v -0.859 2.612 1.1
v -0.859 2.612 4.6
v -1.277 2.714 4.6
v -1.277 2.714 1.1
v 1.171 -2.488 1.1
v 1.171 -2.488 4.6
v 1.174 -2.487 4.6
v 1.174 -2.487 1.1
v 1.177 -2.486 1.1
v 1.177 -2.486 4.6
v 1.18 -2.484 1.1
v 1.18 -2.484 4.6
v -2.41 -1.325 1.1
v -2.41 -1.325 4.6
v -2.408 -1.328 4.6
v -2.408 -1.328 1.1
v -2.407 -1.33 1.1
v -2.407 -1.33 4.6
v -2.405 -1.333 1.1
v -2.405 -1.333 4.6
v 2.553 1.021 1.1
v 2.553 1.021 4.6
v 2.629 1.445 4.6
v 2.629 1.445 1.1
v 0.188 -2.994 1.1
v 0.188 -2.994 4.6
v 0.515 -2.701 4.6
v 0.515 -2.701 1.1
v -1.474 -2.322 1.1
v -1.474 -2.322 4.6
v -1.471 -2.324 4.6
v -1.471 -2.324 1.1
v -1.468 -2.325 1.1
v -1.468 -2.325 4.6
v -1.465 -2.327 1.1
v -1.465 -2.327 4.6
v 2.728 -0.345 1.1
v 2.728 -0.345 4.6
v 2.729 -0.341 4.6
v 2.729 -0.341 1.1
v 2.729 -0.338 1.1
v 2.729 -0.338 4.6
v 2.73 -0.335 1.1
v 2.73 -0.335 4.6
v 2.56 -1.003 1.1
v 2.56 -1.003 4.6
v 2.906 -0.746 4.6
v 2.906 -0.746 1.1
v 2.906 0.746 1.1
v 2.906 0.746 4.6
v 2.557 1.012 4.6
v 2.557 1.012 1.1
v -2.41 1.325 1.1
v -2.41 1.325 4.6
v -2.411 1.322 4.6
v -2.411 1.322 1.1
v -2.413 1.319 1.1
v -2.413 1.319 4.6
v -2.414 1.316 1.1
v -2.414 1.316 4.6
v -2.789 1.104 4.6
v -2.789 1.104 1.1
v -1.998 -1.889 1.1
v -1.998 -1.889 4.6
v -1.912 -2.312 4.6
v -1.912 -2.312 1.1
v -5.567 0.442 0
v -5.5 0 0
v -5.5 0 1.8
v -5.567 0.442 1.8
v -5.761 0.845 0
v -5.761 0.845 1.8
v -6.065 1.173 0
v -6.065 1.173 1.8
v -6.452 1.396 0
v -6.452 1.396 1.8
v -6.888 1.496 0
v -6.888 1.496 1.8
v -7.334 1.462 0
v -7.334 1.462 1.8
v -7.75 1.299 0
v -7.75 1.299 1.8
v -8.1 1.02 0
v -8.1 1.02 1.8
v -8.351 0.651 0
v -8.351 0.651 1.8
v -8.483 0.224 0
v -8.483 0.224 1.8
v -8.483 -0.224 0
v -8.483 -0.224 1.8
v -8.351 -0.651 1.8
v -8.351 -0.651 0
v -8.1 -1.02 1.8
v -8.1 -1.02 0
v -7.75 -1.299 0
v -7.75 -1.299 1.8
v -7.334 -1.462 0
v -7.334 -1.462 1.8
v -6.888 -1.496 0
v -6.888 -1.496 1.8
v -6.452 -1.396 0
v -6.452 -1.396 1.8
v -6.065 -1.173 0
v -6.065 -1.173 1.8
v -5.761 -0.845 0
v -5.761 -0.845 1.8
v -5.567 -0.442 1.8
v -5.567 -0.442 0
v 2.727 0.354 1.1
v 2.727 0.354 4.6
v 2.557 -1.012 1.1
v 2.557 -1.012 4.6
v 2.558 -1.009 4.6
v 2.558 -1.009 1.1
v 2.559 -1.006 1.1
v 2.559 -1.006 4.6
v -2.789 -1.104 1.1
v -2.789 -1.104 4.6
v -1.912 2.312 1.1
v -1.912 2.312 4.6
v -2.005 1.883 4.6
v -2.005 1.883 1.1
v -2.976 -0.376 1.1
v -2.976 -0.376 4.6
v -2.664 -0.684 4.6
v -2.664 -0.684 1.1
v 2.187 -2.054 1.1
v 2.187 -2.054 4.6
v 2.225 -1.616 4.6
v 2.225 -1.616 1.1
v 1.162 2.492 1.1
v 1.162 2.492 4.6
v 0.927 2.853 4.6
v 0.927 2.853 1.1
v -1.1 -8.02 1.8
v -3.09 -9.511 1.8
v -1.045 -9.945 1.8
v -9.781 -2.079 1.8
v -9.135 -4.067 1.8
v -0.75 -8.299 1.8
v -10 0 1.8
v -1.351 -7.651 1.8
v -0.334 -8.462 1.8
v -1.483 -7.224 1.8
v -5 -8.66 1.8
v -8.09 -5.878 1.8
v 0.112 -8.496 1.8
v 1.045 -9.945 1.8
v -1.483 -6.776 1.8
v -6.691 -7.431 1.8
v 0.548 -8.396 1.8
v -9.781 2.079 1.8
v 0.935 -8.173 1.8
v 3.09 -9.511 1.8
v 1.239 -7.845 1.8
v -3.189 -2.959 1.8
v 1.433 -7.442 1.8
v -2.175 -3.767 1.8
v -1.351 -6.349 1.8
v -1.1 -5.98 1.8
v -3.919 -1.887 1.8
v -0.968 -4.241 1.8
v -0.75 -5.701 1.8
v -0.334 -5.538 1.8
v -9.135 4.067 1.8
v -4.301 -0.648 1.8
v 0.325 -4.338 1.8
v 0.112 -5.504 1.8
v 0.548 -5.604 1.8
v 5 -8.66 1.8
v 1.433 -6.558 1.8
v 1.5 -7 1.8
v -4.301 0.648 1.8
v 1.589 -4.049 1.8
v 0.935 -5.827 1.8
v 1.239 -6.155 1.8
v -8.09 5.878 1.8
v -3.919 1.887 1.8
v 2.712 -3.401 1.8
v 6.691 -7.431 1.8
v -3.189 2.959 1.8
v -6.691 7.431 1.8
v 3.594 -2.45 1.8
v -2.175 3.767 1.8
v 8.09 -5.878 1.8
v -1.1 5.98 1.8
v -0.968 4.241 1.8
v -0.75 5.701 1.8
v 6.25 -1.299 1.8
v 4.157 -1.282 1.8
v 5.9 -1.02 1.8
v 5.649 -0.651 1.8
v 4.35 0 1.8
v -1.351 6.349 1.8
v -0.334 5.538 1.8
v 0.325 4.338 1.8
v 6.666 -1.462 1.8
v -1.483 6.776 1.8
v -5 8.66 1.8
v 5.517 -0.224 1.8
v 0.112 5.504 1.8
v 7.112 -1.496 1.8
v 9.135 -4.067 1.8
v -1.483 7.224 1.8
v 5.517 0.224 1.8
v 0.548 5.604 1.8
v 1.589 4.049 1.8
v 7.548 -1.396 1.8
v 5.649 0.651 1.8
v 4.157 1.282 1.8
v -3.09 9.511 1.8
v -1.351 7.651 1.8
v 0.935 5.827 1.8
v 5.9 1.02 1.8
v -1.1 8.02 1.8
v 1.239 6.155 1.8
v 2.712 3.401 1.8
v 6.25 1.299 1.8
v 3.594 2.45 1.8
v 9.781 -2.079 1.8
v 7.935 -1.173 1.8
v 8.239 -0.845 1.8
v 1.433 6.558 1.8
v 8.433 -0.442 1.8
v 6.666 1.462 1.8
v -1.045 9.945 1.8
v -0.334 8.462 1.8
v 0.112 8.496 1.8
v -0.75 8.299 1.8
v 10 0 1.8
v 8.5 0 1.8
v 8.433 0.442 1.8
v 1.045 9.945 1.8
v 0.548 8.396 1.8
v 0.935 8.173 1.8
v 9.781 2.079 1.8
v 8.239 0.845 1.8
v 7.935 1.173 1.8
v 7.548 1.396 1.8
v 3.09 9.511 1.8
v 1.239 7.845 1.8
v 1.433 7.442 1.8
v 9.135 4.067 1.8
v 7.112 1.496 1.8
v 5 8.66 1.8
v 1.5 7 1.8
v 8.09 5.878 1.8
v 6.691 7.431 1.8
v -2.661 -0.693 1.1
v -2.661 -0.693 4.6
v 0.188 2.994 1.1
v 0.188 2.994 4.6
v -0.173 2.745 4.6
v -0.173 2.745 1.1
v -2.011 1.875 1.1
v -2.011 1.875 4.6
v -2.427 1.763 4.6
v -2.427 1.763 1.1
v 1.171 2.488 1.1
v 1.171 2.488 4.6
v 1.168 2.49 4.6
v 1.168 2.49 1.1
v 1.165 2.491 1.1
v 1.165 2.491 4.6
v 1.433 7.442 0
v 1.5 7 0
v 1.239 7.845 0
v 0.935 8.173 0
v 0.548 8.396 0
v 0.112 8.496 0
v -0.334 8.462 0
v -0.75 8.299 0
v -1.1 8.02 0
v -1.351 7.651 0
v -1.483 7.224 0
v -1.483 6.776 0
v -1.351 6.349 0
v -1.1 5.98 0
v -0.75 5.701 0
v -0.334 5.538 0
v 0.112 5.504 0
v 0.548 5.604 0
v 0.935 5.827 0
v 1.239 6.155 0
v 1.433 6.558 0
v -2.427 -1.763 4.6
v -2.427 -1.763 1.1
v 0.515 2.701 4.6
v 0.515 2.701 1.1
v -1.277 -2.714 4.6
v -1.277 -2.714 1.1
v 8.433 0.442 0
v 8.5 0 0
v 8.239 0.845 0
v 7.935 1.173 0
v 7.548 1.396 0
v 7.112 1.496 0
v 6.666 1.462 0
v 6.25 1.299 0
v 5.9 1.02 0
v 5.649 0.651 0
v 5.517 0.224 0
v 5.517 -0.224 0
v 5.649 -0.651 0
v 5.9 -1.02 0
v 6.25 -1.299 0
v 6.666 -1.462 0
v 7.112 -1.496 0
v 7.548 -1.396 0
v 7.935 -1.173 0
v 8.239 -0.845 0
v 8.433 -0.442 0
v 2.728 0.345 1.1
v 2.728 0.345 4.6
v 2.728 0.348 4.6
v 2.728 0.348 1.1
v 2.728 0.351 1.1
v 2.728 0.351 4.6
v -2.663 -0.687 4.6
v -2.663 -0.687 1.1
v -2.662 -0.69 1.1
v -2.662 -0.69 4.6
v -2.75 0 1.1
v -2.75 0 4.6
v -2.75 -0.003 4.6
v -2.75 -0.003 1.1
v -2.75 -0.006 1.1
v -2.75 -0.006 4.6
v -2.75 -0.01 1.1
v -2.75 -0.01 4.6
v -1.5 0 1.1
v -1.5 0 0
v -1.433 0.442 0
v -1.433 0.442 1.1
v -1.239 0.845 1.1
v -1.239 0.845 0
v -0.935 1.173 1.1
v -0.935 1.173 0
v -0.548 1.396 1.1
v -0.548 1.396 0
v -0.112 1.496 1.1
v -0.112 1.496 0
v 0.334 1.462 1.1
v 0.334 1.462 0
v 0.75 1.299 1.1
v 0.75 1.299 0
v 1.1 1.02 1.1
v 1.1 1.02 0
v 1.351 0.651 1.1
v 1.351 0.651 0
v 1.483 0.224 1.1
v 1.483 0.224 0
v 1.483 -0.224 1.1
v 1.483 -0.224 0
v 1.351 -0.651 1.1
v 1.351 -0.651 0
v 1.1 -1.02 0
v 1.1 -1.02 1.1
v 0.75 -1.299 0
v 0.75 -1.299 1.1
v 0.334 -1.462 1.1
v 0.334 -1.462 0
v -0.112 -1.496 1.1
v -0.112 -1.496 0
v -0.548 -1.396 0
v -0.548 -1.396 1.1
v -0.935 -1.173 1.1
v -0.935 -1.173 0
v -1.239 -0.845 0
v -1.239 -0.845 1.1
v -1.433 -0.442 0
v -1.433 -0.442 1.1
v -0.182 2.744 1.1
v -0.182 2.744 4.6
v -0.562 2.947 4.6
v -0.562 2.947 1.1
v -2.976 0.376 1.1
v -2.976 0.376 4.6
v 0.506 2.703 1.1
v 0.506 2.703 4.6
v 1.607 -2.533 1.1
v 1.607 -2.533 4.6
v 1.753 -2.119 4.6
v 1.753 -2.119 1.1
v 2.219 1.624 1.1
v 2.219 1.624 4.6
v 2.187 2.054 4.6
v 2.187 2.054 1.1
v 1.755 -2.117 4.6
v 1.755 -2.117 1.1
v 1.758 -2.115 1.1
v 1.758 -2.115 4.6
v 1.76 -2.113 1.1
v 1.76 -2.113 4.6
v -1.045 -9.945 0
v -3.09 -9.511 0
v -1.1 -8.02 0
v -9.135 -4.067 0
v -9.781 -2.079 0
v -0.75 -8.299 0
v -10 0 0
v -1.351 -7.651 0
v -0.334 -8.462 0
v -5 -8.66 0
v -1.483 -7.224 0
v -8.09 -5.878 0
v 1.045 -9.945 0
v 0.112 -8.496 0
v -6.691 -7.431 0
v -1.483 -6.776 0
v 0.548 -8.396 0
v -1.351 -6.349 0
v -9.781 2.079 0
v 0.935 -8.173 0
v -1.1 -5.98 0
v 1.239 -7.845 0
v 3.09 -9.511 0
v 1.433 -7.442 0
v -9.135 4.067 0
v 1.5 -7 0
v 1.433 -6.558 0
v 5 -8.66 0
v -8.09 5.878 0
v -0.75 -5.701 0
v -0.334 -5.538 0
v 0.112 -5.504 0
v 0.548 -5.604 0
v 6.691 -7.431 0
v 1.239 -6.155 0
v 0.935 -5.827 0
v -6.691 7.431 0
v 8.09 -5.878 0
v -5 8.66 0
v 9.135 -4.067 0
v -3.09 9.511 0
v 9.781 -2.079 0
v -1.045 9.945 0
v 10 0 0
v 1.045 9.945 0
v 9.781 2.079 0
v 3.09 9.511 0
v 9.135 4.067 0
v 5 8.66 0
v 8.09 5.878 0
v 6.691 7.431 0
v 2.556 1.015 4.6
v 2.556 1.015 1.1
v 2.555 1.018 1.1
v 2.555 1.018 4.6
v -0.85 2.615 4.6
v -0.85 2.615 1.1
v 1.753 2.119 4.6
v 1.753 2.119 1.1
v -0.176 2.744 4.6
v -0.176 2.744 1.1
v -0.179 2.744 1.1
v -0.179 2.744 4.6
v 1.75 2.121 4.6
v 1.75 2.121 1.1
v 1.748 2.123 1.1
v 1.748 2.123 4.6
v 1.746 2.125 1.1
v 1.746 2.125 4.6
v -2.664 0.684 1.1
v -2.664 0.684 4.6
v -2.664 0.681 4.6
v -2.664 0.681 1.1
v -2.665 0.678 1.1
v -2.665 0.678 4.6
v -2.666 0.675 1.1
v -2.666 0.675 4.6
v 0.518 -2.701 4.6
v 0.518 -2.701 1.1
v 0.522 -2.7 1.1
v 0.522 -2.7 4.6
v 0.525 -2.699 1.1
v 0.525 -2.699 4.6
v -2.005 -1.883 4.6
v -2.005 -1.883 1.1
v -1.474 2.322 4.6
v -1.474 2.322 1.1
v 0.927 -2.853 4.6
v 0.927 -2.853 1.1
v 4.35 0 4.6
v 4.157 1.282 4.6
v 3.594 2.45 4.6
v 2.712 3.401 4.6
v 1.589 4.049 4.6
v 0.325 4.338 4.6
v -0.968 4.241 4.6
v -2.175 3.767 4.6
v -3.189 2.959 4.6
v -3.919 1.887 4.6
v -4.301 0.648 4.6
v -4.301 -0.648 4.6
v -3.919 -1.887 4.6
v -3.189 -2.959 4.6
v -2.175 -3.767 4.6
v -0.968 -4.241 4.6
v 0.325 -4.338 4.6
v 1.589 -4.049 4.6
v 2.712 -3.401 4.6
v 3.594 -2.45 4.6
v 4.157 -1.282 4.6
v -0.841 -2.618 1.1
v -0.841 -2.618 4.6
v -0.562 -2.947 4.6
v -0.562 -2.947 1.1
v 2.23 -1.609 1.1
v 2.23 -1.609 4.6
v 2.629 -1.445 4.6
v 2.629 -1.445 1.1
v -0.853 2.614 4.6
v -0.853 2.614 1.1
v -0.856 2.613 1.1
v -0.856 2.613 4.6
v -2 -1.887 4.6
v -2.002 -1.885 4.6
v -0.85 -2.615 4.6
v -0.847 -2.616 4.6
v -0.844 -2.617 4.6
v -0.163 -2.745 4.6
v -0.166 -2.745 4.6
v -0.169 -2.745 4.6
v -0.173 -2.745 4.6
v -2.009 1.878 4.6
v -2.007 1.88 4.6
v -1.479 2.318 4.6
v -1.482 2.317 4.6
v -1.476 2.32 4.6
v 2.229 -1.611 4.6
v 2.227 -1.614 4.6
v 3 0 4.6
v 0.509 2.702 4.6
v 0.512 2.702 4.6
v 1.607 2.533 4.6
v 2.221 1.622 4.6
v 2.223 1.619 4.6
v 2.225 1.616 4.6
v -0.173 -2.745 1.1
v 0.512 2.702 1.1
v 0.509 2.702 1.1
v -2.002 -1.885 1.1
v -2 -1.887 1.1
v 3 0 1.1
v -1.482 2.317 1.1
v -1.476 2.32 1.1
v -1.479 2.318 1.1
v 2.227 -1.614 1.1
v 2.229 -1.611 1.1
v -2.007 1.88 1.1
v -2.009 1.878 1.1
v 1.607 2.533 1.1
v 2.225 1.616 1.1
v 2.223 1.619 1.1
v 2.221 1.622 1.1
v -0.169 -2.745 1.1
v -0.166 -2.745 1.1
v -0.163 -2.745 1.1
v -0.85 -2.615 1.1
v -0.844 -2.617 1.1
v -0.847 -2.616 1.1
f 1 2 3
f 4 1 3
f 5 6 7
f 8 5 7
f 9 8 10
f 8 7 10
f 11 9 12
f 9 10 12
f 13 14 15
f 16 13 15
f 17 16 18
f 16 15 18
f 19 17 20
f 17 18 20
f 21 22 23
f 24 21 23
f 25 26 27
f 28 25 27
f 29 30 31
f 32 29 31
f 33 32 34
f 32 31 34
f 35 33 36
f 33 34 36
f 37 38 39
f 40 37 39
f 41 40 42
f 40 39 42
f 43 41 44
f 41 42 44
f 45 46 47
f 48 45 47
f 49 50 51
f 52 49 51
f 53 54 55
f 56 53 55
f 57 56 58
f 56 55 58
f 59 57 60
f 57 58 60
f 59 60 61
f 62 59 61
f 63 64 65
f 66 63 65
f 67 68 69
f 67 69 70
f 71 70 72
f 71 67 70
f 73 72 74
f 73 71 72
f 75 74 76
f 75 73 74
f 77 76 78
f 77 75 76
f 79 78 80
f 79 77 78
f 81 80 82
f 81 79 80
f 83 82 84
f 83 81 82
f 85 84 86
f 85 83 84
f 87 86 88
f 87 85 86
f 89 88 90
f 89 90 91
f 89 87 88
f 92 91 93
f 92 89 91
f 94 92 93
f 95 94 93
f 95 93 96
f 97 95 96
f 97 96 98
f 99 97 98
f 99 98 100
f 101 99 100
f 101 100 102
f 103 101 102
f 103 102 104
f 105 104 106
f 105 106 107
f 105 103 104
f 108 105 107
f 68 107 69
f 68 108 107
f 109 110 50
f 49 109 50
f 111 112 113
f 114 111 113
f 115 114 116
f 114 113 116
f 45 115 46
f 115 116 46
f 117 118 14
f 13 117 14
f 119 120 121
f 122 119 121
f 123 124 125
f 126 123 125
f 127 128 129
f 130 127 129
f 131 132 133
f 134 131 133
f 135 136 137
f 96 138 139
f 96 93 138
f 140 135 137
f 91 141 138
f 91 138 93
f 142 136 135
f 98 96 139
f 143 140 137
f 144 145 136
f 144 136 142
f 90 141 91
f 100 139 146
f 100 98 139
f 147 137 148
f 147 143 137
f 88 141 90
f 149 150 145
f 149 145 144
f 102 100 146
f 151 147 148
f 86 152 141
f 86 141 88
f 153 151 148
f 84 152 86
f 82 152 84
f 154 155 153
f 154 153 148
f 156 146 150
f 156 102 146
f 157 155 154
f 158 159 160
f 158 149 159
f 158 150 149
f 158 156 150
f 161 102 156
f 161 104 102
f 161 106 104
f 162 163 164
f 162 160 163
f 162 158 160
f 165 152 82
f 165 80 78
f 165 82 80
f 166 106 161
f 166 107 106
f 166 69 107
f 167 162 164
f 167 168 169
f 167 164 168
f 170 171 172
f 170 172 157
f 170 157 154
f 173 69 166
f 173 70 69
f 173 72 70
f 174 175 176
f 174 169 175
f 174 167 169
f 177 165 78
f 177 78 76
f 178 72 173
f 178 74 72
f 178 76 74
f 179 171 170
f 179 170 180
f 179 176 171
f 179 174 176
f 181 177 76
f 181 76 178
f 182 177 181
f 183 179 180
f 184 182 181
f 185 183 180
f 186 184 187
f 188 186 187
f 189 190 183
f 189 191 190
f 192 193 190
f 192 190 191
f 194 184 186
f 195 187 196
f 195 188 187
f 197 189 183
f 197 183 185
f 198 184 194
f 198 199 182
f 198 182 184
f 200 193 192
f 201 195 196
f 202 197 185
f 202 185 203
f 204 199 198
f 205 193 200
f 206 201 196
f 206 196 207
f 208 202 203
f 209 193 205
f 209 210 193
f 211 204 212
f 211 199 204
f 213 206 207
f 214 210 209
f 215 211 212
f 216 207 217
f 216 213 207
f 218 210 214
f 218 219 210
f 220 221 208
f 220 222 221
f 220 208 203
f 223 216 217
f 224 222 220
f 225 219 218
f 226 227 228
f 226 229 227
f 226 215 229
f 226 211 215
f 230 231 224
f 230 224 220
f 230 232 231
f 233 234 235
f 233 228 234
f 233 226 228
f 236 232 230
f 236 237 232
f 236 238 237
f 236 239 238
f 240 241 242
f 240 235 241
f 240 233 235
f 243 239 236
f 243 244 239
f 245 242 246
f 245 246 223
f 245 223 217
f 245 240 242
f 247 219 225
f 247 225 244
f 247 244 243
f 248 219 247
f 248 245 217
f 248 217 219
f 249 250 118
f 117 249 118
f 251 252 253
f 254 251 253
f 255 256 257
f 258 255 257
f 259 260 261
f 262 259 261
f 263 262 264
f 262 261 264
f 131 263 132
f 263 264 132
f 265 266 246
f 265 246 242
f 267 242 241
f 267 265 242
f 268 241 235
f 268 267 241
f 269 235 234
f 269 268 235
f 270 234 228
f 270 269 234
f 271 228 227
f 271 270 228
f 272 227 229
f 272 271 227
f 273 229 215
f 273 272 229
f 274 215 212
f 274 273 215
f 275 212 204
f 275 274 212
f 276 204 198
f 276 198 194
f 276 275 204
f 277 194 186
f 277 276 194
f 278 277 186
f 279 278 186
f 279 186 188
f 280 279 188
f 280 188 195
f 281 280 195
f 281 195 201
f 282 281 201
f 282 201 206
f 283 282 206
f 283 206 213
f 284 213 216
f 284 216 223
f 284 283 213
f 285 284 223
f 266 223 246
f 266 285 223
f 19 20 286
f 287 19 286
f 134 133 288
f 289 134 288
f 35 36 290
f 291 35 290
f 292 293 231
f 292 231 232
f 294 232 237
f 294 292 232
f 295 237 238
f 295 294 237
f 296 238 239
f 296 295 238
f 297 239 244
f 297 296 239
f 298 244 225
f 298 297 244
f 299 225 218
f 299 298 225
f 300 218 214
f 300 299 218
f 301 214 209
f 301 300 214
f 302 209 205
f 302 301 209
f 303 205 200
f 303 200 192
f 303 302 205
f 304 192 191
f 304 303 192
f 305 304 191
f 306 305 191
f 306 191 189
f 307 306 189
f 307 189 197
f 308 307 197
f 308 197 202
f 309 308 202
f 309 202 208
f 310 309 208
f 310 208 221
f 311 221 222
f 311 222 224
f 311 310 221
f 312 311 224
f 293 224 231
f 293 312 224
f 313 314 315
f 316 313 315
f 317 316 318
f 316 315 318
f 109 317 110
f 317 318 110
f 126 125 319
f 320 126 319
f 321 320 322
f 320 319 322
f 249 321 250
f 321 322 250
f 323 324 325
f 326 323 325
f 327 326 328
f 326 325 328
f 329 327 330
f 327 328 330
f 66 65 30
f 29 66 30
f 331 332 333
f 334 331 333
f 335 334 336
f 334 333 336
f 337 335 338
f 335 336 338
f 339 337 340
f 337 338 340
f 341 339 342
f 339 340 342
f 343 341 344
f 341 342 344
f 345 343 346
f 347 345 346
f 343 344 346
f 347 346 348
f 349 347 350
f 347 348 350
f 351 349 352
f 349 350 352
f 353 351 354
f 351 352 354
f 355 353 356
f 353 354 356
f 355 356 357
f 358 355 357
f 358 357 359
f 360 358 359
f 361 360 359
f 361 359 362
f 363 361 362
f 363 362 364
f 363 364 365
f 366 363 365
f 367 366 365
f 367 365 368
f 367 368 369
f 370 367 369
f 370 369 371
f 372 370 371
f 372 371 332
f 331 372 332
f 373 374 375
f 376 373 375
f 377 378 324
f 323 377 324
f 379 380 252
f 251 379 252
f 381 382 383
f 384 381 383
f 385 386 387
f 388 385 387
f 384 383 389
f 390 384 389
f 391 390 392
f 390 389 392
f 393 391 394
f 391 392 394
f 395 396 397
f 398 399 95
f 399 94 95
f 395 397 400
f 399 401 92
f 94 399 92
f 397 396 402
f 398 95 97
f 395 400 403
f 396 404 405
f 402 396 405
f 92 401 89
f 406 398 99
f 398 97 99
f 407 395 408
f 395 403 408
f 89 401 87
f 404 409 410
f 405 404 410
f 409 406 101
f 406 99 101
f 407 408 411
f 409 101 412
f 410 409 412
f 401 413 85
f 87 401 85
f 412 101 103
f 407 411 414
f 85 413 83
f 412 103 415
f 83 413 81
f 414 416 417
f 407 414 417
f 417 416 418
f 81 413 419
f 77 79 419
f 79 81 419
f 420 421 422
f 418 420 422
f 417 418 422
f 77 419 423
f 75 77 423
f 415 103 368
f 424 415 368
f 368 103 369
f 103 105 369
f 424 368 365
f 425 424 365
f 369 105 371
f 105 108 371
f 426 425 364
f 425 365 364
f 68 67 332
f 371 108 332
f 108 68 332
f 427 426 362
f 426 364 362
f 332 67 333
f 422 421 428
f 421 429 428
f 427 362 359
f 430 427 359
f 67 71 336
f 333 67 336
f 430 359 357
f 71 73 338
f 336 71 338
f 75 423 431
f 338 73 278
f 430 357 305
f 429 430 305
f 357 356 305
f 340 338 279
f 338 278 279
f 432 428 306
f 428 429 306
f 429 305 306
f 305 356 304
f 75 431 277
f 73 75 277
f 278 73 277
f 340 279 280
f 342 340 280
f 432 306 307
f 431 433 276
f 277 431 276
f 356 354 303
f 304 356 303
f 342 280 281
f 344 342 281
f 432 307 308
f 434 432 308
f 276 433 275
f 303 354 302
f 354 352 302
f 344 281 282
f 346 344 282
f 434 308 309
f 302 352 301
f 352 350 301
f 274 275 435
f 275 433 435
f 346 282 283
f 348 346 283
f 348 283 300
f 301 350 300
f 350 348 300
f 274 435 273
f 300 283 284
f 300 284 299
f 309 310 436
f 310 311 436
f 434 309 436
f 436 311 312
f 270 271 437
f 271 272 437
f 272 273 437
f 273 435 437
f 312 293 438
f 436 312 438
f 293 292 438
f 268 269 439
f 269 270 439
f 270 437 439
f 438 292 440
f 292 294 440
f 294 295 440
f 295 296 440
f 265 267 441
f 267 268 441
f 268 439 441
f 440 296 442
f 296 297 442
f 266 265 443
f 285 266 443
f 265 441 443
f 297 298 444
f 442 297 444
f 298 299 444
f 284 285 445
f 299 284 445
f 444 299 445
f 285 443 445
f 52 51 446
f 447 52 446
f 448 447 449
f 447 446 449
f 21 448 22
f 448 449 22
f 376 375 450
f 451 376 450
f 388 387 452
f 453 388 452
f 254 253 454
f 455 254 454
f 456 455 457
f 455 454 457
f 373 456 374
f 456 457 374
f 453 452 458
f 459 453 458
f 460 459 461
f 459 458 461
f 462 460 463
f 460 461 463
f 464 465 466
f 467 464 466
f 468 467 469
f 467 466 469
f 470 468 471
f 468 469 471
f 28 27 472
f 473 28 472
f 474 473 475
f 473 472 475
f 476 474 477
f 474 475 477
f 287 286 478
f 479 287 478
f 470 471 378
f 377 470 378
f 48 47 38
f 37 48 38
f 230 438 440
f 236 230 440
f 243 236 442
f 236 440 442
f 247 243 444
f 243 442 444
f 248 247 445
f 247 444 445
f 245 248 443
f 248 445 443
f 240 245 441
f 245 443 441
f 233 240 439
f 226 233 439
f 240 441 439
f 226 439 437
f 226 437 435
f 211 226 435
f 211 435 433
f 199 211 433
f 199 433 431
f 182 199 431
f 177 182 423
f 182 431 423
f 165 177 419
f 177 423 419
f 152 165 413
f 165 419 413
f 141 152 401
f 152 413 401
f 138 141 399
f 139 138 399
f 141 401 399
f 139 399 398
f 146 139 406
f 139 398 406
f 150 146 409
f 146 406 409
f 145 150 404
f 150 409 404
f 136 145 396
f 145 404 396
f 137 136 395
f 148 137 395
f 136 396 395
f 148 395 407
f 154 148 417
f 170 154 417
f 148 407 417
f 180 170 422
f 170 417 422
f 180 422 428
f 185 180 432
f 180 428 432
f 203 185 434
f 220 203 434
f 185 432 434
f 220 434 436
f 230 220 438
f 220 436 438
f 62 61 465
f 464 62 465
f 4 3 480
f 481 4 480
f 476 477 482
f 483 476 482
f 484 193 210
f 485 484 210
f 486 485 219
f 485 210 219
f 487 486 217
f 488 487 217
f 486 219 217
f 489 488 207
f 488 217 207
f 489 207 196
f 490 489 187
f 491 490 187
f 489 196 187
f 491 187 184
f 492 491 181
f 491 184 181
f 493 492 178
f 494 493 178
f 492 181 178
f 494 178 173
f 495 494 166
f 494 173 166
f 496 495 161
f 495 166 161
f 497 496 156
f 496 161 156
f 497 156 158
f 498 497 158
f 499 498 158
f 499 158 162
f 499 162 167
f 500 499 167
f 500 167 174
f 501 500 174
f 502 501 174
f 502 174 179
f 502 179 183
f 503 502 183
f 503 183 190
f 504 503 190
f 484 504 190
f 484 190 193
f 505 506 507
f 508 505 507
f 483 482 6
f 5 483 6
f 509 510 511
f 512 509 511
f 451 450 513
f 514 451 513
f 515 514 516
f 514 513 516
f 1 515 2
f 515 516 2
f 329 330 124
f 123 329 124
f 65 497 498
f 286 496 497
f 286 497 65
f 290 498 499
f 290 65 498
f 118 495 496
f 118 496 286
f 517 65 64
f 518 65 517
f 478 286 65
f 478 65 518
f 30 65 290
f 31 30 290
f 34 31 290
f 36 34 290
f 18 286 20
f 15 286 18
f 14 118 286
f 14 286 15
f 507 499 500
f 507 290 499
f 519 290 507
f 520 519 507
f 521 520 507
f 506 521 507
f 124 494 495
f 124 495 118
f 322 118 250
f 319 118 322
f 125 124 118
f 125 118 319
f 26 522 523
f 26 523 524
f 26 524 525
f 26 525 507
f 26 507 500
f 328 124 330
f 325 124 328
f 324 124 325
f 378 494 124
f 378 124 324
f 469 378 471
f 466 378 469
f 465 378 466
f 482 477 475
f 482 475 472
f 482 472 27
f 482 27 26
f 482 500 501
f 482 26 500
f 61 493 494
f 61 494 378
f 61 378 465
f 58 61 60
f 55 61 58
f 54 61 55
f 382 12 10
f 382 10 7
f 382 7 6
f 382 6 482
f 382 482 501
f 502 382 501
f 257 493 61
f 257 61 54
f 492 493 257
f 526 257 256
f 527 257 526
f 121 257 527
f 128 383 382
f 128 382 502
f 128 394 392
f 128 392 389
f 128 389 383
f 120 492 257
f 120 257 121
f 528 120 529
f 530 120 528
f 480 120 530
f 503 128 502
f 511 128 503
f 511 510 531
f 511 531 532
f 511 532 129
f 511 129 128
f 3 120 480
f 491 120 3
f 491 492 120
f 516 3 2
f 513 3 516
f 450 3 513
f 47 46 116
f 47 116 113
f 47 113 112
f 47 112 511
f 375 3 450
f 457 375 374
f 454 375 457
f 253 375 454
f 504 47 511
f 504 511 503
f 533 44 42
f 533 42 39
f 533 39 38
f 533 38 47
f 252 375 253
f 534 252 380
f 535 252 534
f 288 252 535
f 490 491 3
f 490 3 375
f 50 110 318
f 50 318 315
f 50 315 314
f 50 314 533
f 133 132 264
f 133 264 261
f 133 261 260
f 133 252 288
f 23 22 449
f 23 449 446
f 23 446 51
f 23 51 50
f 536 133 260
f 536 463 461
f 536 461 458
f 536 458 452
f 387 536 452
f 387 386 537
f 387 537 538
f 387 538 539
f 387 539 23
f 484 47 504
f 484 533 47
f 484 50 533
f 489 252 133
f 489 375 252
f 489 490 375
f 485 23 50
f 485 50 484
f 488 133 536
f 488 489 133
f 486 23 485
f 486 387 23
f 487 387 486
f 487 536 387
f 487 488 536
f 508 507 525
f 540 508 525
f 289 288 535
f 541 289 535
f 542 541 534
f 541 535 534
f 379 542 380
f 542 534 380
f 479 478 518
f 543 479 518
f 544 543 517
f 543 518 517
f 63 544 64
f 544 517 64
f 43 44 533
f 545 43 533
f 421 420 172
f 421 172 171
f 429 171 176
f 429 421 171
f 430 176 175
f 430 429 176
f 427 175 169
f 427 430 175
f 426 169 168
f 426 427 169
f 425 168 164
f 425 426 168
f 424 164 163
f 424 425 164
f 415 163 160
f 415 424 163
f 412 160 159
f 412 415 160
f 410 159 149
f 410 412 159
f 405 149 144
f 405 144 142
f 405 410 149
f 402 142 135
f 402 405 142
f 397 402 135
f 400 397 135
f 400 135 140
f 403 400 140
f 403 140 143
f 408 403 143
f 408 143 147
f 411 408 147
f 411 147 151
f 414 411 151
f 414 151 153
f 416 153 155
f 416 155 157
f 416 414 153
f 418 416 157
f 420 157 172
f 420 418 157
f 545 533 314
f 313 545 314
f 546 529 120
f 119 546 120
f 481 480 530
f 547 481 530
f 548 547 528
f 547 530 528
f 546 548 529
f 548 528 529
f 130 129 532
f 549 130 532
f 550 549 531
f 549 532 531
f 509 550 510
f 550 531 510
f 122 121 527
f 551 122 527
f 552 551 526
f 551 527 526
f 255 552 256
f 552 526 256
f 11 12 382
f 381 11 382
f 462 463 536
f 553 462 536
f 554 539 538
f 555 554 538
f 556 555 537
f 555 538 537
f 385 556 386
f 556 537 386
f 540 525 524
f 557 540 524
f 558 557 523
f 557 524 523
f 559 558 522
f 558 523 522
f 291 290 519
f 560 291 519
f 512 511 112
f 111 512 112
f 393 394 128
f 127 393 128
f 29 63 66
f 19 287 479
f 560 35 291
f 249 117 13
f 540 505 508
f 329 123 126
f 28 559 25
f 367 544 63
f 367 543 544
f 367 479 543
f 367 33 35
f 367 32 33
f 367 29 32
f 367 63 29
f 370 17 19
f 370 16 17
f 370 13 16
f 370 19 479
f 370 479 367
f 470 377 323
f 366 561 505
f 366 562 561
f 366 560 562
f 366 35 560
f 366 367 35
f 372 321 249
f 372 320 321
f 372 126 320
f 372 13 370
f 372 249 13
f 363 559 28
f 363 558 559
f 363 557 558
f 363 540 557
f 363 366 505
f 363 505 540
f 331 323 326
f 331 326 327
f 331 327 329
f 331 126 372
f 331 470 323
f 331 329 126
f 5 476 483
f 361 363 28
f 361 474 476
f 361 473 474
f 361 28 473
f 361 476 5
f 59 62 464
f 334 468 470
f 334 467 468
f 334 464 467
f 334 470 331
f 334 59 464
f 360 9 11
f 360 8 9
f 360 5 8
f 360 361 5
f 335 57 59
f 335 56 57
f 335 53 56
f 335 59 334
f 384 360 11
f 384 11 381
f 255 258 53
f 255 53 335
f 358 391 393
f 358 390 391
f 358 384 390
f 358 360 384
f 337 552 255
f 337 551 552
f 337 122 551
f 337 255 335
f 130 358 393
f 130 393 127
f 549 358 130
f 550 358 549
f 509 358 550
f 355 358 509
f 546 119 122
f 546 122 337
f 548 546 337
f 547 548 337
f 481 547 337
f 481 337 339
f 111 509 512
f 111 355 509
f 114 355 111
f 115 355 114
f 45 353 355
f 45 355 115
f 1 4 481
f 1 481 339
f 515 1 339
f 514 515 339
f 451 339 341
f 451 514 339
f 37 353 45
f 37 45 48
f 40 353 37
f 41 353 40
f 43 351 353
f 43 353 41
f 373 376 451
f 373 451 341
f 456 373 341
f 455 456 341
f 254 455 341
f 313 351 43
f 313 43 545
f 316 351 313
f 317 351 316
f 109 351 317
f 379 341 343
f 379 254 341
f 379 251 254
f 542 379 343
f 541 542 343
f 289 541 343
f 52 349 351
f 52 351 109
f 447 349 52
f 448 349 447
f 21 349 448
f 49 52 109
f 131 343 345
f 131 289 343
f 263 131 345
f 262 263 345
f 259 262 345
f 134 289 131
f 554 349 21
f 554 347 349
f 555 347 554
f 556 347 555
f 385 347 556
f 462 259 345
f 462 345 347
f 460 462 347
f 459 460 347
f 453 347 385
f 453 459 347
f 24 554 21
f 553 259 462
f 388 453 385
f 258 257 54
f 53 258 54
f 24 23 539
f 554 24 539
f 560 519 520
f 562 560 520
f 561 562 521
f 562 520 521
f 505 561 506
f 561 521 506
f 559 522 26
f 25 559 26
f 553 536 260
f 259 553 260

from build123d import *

# Parameters (mm, degrees)
SKETCH1_R           = 10
SKETCH1_R_2         = 1.5
SKETCH1_R_3         = 4.35
BOSS_EXTRUDE1_DEPTH = 1.8
SKETCH1_2_R         = 4.35
BOSS_EXTRUDE2_DEPTH = 4.6
SKETCH2_R           = 1.5
CUT_EXTRUDE1_DEPTH  = 4.5
SKETCH3_R           = 2.75
CUT_EXTRUDE2_DEPTH  = 3.5
CUT_EXTRUDE3_DEPTH  = 3.5
CIRPATTERN1_COUNT   = 25


with BuildPart() as part:
    # Sketch1 → Boss-Extrude1 (new body)
    with BuildSketch(Plane.XY):
        Circle(SKETCH1_R)
        with Locations((0, 7)):
            Circle(SKETCH1_R_2, mode=Mode.SUBTRACT)
        with Locations((7, 0)):
            Circle(SKETCH1_R_2, mode=Mode.SUBTRACT)
        with Locations((0, -7)):
            Circle(SKETCH1_R_2, mode=Mode.SUBTRACT)
        with Locations((-7, 0)):
            Circle(SKETCH1_R_2, mode=Mode.SUBTRACT)
        Circle(SKETCH1_R_3, mode=Mode.SUBTRACT)
    extrude(amount=BOSS_EXTRUDE1_DEPTH)

    # Sketch1<2> → Boss-Extrude2 (add)
    with BuildSketch(Plane.XY):
        Circle(SKETCH1_2_R)
    extrude(amount=BOSS_EXTRUDE2_DEPTH)

    # Sketch2 → Cut-Extrude1 (cut)
    with BuildSketch(Plane(origin=(0, 0, 0), x_dir=(-1, 0, 0), z_dir=(0, 0, -1))):
        Circle(SKETCH2_R)
    extrude(amount=-CUT_EXTRUDE1_DEPTH, mode=Mode.SUBTRACT)

    # Sketch3 → Cut-Extrude2 (cut)
    with BuildSketch(Plane.XY.offset(4.6)):
        Circle(SKETCH3_R)
    extrude(amount=-CUT_EXTRUDE2_DEPTH, mode=Mode.SUBTRACT)

    # Sketch4 → Cut-Extrude3 (cut)
    with BuildSketch(Plane.XY.offset(4.6)):
        with BuildLine():
            Line((-2.976344104, 0.375999701), (-2.75, 0))
            ThreePointArc((-2.75, 0), (-2.728912829, 0.339904061), (-2.665974712, 0.674595311))
            Line((-2.665974712, 0.674595311), (-2.976344104, 0.375999701))
        make_face()
    cut_extrude3 = extrude(amount=-CUT_EXTRUDE3_DEPTH, mode=Mode.SUBTRACT)

    # CirPattern1: Cut-Extrude3 ×25 about axis
    cirpattern1_axis = Axis((0, 0, 4.5), (0, 0, -1))
    for i in range(1, CIRPATTERN1_COUNT):
        add(cut_extrude3.rotate(cirpattern1_axis, i * 360 / CIRPATTERN1_COUNT), mode=Mode.SUBTRACT)


solid = part.part
